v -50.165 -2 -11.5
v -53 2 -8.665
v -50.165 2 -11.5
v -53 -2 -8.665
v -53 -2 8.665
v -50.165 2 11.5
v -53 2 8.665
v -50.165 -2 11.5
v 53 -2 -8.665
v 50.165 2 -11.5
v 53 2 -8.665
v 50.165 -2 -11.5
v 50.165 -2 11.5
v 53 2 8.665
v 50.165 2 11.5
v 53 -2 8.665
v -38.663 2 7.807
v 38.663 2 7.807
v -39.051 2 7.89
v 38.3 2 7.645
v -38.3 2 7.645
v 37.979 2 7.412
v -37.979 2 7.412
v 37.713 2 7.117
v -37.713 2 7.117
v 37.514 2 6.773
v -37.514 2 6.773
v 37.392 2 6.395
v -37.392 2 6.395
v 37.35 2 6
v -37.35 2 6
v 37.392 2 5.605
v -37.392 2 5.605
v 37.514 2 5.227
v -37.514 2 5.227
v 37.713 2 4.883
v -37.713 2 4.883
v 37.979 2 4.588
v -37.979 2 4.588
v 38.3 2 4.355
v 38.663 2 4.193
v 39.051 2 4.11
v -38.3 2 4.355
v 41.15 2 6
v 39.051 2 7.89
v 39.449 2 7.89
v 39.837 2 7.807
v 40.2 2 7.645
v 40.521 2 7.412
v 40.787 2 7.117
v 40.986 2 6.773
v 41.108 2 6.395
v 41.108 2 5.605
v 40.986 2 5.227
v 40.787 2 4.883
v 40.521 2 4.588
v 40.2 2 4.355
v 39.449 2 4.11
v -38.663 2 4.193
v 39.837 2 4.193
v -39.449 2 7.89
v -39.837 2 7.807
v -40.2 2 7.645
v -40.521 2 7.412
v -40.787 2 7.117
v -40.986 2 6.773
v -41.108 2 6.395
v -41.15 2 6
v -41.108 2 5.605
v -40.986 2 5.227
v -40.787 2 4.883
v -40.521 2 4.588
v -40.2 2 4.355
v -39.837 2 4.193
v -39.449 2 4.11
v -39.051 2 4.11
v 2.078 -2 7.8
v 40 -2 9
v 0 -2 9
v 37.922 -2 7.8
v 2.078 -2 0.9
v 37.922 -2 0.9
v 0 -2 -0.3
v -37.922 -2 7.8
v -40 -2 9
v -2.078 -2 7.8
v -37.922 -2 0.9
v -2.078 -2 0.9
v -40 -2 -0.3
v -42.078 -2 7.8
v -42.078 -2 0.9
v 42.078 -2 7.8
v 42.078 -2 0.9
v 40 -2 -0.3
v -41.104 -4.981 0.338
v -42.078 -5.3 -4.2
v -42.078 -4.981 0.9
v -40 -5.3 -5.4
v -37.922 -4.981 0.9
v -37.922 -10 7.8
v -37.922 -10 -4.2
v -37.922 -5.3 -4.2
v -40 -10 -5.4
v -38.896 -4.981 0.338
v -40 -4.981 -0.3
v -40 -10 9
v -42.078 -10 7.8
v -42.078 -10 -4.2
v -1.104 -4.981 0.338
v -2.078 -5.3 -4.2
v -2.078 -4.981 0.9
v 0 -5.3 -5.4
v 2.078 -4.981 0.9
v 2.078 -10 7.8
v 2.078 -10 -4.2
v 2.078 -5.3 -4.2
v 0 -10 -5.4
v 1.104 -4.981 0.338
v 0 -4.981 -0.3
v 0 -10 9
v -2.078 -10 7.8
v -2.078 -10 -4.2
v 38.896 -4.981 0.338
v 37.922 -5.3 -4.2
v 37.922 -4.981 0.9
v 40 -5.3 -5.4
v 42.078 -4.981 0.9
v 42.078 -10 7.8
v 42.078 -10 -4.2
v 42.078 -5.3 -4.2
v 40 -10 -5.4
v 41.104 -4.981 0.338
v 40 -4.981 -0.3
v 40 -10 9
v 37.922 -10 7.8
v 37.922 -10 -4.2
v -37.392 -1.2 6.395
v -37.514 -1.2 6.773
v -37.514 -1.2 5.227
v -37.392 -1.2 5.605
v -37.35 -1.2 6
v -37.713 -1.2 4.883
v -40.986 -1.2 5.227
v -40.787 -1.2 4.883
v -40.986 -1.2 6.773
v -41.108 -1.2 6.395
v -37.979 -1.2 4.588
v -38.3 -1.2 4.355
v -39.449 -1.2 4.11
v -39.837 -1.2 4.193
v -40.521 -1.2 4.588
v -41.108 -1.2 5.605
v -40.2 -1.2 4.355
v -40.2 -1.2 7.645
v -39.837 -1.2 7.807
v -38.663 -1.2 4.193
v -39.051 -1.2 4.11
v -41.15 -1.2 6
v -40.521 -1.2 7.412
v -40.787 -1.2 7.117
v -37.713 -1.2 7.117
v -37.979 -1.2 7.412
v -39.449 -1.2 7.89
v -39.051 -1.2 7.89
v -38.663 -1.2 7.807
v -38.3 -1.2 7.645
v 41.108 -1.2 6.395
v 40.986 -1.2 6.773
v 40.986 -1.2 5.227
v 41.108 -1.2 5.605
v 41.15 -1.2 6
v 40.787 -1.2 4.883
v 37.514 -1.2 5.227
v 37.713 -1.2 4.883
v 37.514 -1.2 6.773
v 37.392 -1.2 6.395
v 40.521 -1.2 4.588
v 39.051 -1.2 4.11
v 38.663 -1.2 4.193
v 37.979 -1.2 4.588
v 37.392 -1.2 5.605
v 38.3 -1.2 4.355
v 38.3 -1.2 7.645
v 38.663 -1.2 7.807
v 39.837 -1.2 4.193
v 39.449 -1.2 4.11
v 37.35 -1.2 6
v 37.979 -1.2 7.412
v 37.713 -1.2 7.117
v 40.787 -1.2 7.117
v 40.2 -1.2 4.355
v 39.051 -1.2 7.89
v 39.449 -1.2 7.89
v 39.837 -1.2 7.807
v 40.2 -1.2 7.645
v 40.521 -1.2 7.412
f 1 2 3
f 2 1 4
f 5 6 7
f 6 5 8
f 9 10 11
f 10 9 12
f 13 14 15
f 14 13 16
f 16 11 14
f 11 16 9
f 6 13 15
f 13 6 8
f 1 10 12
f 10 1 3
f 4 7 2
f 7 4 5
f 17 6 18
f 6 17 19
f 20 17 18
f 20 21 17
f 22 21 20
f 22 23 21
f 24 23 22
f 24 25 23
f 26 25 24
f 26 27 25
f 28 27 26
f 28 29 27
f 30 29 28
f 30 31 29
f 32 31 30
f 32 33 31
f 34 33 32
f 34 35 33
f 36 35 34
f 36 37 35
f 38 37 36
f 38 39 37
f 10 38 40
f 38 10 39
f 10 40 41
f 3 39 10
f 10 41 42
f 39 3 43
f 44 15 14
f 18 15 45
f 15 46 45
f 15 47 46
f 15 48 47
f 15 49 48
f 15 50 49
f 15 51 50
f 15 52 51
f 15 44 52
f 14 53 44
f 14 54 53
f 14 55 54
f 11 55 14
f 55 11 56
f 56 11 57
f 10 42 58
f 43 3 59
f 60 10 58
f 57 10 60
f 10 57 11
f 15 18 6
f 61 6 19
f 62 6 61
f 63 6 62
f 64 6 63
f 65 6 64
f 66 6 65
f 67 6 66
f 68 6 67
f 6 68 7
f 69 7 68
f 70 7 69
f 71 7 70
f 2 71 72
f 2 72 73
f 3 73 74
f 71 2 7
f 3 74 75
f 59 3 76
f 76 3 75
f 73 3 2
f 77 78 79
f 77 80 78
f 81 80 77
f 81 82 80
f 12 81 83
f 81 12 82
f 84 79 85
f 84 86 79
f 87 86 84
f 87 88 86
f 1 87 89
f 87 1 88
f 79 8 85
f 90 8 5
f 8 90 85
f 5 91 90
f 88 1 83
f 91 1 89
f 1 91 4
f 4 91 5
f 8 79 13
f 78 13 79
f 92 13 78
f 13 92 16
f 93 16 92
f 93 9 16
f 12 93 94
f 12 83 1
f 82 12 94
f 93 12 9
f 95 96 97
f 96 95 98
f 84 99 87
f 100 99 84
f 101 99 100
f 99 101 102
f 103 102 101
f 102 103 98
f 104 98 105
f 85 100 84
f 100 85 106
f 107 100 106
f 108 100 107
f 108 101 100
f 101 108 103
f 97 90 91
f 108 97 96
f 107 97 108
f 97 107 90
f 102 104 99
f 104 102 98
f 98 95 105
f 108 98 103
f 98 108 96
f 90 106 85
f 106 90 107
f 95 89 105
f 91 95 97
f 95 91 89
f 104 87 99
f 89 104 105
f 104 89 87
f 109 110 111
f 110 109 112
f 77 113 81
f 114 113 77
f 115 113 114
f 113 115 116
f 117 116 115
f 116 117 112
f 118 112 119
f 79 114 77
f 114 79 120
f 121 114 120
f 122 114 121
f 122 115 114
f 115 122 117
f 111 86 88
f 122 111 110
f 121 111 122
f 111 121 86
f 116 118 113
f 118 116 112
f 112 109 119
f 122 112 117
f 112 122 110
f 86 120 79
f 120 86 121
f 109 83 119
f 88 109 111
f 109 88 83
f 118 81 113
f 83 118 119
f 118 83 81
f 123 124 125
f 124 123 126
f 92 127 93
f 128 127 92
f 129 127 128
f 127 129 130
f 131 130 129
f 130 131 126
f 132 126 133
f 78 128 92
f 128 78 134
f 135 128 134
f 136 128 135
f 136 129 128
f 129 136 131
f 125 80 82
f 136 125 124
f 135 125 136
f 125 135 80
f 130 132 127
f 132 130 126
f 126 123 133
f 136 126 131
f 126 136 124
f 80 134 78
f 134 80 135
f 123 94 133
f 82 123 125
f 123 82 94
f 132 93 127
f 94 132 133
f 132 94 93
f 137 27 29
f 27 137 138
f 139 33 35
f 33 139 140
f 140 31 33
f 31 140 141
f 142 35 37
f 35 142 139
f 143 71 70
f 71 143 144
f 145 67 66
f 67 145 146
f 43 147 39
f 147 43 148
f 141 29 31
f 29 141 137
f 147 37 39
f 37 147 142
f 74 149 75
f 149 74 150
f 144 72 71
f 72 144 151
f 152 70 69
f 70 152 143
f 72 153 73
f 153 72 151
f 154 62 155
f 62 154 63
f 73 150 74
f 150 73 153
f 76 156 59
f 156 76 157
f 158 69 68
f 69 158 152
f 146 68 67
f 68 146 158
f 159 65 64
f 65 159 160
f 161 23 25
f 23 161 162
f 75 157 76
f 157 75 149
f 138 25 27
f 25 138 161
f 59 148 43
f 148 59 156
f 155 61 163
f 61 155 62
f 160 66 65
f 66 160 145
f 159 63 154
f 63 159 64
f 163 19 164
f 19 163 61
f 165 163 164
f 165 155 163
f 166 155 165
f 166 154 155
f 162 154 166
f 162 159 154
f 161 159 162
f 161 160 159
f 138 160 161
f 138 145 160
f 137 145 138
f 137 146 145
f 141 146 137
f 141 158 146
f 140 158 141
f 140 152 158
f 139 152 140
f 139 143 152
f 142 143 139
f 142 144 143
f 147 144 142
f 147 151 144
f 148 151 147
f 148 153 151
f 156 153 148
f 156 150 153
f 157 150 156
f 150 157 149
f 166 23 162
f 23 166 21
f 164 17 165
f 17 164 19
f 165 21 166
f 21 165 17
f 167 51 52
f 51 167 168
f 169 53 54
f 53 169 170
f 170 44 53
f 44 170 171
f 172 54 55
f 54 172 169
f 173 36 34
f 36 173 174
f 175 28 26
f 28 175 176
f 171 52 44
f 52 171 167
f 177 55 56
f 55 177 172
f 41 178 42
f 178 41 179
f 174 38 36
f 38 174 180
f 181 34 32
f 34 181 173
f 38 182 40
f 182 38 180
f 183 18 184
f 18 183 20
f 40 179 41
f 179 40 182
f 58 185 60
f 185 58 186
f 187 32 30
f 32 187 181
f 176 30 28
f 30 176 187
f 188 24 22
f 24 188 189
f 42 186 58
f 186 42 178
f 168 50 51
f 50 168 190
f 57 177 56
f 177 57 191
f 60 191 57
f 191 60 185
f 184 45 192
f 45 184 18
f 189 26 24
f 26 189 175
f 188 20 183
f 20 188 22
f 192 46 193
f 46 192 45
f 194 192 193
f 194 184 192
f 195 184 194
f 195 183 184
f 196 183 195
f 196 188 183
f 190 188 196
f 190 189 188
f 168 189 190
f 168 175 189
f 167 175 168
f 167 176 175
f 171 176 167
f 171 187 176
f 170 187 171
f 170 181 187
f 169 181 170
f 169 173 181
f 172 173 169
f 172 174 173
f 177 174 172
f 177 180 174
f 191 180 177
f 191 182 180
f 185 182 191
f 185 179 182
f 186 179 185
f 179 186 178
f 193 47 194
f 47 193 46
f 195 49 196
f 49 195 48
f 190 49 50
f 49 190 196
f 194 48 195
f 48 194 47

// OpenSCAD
// Bolts M4 x 8 mm

h = 23;
w = 106;
t = 8-5+1;
fixCenters = 78.5;
fixT = 4.2;

$fn = 30;

difference() {
  union() {
    difference() {
      // rotate([90,0,0]) linear_extrude(t) offset(4) offset(-4) square([w,h], center=true);
      cube([w,t,h], center=true);
      for (x=[-w/2,w/2]) for (z=[-h/2,h/2])
        translate([x,0,z]) rotate([0,45,0]) cube(t+0.01, center=true);
      }

    hookZ = 9;
    translate([-40,0,hookZ]) hook();
    translate([0,0,hookZ]) hook();
    translate([40,0,hookZ]) hook();
  }

  translate([-fixCenters/2,t/2,6]) fixing();
  translate([fixCenters/2,t/2,6]) fixing();
}

module fixing() {
  rotate([-90,0,0]) translate([0,0,-8+5-0.2]) cylinder(d=3.8, h=6);
//  pt = 5;
//  rotate([-90,0,0]) {
//    hull() {
//      cylinder(d=5, h=pt);
//      translate([0,5,0]) cylinder(d=6, h=pt);
//    };
//    translate([0,0,pt]) hull() {
//      cylinder(d=5, h=2);
//      translate([0,-2,0]) cylinder(d=5, h=2);
//    }
//  }
}
  

module hook() {
  // t is the amount we reduce the width/height by to let it fit ok
  t = 0.1;
  // w = width
  w = 5;
  // wt is the width less the t
  wt = w - t * 2;
  // h is the hight less a bit to make it fit
  h = 15 - 0.3;
  // h2 is the height of the smaller part of the peg
  h2 = h - 5;
  // ht is the height less t
  ht = h - t;
  // d is the depth of the board
  d = 5;
  // 12 gives us enough facets to create a easy to print angle
  $fn = 6;

  translate([0, -d*2, -wt/2]) rotate([270, 90,0]) union() {
    // The larger part of the peg
    hull() {
      cylinder(d=wt, h=d + 0.3);
      // -0.3 is the taper applied to the face that makes contact with the back on the pegboard
      translate([ht-w, 0, 0]) cylinder(d=wt, h=d -0.3);
    }
    // The smaller part of the peg
    translate([0, 0, 0]) hull() {
      cylinder(d=wt, h = d * 2);
      translate([h2 - w - t * 2 ,0 ,0]) cylinder(d=wt, h=d * 2);
      };
  }
}
